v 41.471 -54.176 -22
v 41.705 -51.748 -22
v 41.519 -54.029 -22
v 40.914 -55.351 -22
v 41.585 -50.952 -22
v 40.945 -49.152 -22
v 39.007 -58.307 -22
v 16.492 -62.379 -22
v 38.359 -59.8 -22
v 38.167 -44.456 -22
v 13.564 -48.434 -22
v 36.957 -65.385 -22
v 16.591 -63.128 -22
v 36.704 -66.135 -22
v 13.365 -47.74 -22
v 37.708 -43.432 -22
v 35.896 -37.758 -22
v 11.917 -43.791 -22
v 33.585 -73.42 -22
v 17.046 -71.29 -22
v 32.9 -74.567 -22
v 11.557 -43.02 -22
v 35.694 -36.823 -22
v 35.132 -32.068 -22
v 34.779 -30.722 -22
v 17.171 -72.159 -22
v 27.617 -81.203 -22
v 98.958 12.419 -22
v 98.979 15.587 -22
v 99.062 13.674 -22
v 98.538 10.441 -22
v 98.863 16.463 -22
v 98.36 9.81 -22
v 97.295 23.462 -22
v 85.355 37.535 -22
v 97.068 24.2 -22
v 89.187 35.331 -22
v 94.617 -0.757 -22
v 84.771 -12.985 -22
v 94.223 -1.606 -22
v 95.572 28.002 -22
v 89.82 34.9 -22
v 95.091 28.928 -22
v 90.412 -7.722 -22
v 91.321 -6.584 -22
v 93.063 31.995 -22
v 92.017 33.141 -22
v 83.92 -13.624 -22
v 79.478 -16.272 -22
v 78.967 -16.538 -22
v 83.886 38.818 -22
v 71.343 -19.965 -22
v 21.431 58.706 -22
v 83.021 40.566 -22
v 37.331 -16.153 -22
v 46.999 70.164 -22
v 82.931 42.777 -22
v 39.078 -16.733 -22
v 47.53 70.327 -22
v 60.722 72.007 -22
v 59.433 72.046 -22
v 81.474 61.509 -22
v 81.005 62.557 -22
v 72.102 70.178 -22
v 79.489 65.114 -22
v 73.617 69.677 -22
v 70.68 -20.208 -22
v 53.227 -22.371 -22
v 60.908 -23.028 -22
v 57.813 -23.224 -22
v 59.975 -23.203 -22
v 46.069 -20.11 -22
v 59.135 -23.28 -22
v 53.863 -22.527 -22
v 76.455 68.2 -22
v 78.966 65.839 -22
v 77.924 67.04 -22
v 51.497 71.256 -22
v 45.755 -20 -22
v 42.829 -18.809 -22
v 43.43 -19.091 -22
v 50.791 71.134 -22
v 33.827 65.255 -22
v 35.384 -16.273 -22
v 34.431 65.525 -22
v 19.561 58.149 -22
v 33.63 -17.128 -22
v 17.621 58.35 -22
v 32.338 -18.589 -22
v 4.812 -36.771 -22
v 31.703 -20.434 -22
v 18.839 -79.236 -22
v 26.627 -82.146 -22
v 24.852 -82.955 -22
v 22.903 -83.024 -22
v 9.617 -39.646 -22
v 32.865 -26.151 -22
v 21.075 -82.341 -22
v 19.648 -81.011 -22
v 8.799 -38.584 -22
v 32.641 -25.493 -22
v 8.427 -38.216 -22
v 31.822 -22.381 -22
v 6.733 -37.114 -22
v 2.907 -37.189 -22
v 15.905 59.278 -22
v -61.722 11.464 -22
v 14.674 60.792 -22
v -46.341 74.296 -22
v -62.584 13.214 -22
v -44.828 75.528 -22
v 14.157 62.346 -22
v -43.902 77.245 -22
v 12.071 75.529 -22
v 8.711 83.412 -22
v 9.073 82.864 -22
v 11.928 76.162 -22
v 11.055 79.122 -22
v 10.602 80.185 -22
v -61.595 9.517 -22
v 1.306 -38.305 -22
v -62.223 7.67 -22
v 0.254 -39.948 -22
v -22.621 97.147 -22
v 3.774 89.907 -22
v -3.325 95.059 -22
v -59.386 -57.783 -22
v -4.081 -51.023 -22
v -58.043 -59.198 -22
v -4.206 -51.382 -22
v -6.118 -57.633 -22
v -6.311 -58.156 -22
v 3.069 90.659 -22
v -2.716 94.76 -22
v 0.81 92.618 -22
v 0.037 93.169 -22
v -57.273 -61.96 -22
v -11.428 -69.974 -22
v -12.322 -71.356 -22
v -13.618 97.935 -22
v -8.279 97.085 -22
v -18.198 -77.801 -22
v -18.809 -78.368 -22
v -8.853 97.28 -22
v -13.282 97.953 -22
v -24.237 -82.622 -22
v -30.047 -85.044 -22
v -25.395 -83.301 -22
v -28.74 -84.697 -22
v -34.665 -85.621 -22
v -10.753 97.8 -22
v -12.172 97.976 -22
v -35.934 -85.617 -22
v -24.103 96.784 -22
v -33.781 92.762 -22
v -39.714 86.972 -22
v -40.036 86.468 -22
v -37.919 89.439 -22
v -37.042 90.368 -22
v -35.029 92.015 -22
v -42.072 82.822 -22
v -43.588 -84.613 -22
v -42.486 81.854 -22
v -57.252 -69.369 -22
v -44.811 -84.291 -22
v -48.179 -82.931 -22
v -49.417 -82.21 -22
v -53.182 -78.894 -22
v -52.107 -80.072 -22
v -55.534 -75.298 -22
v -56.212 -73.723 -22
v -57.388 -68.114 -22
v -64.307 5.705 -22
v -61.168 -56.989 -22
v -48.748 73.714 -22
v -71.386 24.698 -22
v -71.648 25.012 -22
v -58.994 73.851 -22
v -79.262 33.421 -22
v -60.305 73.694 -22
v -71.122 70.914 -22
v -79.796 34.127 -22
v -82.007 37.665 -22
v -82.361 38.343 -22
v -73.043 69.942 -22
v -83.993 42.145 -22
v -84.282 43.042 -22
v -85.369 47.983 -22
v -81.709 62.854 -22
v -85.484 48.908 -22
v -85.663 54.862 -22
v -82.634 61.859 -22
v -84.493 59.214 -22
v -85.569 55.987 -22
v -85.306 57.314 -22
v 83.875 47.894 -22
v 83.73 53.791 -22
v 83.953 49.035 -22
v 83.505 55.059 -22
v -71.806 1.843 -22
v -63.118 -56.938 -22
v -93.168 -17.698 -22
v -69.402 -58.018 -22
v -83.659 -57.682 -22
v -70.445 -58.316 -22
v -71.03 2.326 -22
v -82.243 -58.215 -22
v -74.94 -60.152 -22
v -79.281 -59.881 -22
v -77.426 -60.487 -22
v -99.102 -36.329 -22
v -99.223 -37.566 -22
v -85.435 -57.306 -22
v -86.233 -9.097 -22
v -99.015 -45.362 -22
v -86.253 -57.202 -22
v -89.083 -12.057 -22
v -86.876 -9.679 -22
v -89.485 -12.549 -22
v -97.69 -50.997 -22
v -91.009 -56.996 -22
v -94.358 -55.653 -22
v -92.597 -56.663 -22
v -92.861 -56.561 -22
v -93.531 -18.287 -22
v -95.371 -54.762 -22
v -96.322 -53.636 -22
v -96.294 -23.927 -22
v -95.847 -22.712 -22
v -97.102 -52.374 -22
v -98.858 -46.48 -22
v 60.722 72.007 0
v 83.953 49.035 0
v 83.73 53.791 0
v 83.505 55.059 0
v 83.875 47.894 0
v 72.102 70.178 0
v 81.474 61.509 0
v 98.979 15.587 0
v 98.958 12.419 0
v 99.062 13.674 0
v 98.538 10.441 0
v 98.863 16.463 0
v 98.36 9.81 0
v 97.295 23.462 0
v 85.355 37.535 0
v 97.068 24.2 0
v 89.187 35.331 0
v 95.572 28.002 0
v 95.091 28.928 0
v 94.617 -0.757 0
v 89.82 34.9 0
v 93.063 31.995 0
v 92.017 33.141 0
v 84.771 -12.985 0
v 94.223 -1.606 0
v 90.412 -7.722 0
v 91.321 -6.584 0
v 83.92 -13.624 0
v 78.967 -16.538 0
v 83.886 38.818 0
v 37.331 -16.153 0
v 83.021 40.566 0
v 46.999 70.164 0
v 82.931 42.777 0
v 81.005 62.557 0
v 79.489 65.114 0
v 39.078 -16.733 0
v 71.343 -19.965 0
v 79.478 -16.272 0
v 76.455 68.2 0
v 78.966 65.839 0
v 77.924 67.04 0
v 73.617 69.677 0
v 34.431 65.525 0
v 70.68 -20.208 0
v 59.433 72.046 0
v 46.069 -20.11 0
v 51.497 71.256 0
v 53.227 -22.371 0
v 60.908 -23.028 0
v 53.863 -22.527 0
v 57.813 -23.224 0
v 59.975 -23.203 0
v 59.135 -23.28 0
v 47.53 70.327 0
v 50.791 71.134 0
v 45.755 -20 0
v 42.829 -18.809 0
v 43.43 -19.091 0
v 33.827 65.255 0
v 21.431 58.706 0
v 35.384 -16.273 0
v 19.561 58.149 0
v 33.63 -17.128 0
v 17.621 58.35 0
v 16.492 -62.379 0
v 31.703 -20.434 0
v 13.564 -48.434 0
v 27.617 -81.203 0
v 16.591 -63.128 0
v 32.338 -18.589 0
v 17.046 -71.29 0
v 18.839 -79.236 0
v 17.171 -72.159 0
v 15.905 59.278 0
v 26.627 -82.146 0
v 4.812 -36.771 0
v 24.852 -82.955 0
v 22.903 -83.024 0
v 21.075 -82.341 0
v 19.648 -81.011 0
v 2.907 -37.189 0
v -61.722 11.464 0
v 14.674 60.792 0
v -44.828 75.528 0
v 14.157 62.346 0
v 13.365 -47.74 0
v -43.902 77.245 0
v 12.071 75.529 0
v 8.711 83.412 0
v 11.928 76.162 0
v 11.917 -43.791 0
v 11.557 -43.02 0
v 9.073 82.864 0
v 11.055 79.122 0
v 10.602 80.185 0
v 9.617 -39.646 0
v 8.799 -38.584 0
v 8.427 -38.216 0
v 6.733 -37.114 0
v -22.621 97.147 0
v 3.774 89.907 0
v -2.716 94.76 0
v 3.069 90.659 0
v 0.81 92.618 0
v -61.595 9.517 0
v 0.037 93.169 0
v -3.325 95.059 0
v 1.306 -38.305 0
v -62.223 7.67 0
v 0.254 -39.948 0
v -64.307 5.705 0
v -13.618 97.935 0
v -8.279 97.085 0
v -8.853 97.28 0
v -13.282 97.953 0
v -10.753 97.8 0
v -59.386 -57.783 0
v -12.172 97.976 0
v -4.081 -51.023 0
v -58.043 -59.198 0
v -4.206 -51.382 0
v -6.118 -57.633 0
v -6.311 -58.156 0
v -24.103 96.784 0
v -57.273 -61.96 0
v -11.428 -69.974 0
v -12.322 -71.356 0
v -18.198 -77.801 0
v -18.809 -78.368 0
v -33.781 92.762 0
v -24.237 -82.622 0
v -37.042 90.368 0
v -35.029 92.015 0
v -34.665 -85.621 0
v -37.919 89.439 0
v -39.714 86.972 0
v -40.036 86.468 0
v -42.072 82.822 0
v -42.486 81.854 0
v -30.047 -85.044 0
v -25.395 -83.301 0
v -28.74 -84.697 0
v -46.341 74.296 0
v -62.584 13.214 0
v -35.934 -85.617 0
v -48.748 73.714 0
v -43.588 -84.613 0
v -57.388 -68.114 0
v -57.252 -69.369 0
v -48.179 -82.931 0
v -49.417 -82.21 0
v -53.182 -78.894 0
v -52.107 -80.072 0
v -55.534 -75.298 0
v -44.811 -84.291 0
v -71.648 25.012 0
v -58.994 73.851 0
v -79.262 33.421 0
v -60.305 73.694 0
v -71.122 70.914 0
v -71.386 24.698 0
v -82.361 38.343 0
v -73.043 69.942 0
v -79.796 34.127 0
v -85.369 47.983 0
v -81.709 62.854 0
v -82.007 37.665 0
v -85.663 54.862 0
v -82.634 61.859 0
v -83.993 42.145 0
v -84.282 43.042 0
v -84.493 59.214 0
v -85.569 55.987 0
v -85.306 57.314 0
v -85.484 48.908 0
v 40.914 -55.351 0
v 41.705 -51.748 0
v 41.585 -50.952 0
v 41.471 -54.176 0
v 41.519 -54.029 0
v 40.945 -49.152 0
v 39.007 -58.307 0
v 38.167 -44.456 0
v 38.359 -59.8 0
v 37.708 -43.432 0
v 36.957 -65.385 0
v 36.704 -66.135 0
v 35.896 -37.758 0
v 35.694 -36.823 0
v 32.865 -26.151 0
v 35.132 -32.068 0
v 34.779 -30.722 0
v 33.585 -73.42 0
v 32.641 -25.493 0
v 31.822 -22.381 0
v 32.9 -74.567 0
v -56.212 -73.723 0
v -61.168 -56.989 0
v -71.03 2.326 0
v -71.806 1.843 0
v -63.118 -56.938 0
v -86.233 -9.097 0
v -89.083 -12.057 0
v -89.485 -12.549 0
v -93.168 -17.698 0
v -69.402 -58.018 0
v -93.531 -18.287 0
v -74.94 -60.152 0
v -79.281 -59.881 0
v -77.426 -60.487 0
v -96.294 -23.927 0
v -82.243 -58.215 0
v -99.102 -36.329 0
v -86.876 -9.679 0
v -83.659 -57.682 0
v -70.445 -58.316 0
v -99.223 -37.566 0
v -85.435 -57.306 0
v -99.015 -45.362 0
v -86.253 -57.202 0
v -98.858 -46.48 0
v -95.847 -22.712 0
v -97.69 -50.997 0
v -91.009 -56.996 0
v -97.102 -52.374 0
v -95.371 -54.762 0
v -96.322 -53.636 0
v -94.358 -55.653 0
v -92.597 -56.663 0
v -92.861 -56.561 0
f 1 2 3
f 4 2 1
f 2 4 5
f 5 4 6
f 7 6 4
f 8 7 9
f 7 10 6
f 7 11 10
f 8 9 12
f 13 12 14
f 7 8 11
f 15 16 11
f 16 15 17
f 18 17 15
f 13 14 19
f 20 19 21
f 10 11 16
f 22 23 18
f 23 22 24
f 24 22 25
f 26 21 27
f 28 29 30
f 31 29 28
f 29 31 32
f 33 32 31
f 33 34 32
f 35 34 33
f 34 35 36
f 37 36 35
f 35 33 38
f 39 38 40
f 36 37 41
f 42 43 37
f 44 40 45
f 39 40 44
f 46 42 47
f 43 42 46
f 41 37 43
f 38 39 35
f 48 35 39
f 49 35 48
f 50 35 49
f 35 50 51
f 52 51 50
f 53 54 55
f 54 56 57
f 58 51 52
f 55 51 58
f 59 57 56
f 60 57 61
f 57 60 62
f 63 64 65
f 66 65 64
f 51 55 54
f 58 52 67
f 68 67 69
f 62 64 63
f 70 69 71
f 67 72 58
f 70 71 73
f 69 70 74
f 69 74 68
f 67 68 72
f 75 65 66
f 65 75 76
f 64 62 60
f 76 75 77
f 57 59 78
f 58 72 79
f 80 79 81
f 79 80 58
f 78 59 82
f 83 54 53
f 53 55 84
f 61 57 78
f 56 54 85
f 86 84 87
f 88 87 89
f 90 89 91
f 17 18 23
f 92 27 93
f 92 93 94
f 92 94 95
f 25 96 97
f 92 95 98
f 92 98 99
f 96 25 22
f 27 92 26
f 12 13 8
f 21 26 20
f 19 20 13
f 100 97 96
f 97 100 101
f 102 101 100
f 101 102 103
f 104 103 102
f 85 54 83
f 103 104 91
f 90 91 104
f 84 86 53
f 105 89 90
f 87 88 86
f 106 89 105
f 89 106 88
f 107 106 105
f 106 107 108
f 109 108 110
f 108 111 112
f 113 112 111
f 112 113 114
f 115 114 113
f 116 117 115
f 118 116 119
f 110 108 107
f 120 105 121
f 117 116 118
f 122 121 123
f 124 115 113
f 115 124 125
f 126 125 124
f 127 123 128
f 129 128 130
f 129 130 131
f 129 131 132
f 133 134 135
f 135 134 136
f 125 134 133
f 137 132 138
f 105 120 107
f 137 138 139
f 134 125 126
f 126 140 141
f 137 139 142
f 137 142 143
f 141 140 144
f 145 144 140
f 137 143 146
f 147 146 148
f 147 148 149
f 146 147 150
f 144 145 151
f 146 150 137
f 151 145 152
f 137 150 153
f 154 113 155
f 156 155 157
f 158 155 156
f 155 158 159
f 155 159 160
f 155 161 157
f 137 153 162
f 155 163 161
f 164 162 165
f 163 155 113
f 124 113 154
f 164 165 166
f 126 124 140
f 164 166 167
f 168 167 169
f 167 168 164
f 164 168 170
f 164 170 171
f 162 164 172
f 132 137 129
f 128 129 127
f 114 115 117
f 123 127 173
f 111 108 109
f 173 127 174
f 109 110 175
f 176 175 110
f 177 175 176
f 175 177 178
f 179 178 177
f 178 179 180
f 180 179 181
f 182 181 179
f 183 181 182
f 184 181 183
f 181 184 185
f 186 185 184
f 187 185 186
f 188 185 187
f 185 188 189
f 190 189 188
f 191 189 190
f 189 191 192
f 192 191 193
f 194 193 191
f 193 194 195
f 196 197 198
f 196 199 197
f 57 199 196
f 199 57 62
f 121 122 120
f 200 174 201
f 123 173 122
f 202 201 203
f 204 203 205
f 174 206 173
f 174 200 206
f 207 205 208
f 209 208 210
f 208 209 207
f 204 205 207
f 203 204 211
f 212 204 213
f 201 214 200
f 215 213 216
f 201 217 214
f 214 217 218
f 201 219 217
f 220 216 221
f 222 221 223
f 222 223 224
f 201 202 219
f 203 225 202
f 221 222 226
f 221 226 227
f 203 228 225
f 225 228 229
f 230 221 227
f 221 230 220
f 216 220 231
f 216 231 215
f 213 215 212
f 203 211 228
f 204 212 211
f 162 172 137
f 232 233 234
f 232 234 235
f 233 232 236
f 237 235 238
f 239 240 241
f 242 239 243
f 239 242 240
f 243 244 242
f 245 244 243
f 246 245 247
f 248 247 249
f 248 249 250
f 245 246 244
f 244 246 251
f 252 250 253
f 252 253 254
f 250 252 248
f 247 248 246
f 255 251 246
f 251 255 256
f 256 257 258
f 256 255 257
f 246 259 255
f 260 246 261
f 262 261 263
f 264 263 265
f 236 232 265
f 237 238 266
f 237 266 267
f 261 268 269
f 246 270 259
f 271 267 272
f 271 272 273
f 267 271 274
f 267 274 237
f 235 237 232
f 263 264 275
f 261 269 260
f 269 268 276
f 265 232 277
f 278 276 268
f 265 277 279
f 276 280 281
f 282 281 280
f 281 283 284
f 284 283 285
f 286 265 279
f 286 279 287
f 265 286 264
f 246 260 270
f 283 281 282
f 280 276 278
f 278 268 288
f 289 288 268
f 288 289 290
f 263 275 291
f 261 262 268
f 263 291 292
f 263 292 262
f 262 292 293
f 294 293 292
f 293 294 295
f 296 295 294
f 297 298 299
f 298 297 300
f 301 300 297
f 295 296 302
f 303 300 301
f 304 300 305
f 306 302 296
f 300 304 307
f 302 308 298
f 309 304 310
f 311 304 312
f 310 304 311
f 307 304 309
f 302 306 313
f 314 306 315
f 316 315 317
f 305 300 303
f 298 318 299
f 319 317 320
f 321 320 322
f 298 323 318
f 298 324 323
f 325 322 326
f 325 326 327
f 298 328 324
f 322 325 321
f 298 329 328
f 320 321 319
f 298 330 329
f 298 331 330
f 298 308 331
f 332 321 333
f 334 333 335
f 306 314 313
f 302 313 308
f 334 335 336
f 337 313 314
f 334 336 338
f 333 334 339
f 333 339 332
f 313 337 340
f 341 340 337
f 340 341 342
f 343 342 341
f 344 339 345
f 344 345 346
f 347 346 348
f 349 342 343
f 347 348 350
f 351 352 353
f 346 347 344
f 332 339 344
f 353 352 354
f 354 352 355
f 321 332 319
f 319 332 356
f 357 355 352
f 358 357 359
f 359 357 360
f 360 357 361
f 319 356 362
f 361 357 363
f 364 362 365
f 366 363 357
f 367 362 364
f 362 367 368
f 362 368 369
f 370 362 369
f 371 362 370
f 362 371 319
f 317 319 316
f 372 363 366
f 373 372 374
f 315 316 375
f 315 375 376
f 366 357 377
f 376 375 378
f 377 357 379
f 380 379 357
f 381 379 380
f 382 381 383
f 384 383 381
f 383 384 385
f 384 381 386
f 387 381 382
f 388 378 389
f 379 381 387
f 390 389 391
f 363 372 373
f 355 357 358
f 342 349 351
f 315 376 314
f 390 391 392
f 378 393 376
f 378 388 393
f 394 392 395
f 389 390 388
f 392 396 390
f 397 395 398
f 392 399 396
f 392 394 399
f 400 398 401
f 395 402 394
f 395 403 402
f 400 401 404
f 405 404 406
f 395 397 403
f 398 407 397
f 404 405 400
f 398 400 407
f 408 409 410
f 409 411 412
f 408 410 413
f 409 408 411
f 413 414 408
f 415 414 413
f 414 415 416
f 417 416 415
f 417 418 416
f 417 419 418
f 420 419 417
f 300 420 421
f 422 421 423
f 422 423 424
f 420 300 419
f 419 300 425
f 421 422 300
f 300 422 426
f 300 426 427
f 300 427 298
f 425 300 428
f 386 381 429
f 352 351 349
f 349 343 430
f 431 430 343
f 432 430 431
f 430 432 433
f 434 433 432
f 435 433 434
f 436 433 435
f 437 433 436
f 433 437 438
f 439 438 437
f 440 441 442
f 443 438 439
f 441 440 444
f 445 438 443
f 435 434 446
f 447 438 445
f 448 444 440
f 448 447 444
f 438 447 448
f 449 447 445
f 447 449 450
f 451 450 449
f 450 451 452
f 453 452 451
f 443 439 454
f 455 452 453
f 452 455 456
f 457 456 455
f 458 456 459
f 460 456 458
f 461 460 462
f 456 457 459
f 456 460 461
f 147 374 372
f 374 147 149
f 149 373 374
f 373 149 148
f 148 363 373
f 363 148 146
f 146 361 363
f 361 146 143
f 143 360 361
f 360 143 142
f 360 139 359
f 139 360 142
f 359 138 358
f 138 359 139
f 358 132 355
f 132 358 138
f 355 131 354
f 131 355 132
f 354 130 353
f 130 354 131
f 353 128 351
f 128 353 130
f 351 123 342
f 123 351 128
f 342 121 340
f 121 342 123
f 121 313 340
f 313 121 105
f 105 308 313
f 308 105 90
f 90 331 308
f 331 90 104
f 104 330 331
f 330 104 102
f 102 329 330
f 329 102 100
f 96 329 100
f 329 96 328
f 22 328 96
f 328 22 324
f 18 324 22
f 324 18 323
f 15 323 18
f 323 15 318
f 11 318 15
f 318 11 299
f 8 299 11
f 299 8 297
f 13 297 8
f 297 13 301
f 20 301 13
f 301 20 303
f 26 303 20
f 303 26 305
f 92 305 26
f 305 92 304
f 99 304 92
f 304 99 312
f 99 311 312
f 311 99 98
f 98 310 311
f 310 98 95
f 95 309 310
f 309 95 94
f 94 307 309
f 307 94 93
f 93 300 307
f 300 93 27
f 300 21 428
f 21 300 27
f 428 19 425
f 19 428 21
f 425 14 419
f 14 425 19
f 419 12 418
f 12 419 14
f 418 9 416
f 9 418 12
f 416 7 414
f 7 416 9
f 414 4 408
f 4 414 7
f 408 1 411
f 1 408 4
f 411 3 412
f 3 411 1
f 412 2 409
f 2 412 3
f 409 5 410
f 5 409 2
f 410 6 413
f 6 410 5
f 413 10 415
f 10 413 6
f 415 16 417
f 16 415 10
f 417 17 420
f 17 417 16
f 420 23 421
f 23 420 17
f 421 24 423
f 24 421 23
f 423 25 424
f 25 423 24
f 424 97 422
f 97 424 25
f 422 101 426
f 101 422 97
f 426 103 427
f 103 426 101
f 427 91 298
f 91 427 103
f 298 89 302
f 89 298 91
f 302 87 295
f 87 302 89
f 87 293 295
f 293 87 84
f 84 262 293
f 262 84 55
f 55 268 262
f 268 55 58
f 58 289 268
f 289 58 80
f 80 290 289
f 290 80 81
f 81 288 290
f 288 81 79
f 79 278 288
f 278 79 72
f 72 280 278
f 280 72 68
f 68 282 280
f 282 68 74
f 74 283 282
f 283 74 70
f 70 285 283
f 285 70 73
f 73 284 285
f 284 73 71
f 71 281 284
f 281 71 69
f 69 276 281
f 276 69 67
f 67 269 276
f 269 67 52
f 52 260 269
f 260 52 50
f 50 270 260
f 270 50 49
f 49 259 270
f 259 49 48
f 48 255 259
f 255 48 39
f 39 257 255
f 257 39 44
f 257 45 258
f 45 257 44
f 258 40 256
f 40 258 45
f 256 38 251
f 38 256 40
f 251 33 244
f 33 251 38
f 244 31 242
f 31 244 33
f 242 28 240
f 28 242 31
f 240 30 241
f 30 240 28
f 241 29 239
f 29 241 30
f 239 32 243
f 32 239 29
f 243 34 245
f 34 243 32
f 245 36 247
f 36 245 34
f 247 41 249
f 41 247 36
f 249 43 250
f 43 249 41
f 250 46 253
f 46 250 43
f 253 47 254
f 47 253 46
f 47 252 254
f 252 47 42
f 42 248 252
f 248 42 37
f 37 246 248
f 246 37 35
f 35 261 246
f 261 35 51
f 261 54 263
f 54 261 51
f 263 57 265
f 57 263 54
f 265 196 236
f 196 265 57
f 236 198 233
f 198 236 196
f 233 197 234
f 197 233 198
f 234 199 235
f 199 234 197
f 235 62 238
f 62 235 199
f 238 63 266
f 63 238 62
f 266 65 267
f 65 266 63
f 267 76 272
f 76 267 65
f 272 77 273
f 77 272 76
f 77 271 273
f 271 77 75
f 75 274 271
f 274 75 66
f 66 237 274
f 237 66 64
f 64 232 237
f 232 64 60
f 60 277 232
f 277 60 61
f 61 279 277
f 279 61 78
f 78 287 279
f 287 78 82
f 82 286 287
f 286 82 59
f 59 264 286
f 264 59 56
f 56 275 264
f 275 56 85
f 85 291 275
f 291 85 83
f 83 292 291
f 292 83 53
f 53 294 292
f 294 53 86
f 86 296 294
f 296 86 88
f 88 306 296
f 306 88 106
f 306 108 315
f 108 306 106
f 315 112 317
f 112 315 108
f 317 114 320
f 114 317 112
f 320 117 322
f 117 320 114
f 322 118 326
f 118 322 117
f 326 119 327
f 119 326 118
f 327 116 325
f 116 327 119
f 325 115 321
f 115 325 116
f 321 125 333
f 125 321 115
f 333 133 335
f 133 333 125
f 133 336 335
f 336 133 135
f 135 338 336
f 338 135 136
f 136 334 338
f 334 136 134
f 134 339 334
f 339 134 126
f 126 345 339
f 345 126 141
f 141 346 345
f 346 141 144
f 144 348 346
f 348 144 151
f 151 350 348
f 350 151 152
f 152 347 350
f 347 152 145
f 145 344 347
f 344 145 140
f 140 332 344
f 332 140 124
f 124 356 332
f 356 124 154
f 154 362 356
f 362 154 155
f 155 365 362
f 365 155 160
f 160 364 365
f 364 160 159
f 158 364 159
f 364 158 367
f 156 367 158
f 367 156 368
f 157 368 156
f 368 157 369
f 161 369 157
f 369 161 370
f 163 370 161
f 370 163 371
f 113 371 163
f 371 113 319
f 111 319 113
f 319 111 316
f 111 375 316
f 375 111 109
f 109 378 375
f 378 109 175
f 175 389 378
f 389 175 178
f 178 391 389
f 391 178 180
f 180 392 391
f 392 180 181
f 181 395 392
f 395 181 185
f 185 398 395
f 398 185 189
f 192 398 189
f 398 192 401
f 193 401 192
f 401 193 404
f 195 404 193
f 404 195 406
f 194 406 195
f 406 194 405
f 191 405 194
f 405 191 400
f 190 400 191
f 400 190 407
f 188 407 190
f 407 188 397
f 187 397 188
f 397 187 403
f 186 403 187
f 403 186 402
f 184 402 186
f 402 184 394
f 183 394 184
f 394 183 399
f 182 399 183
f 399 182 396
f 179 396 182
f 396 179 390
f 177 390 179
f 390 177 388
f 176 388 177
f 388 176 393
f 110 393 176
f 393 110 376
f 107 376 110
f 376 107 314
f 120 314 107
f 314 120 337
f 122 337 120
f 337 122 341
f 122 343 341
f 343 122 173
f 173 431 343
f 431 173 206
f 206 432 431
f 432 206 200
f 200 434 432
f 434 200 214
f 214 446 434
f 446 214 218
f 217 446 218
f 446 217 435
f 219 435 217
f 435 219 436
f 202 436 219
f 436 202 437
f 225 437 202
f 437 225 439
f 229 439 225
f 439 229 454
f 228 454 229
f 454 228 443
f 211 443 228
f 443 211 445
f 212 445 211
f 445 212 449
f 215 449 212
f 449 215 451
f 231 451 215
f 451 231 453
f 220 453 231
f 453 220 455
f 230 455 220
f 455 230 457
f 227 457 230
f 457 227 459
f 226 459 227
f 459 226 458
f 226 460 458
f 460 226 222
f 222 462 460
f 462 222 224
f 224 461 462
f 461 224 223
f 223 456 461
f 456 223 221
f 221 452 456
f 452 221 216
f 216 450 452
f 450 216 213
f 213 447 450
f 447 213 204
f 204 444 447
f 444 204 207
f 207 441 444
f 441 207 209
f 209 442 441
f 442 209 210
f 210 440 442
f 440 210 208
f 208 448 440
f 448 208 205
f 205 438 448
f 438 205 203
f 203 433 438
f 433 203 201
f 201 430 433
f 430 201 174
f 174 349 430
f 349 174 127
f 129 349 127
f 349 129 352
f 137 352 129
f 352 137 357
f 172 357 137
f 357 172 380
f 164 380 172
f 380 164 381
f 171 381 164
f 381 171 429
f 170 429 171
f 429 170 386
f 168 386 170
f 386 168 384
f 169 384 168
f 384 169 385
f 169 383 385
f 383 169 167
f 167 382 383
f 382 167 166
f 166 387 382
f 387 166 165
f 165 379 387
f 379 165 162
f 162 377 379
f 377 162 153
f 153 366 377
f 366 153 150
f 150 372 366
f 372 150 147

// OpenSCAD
// =============================================================================
//  Traced sketch board — сгенерировано boardcam.trace
// =============================================================================
//  Контур и карман извлечены детерминированно из эскиза через OpenCV.
//  Контракт boardcam совпадает с leaf.scad (кленовый лист).
// =============================================================================

/* [Заготовка] */
// Заготовка по X, мм
blank_x = 240.0;         // [150:5:800]
// Заготовка по Y, мм
blank_y = 240.0;         // [150:5:800]
// Толщина заготовки, мм
blank_thick = 22.0; // [12:1:60]

/* [Изделие] */
// Габарит изделия по X, мм
size_x = 198.33;           // [100:2:760]
// Габарит изделия по Y, мм
size_y = 193.84;           // [100:2:760]
// Высота, мм
thick = 22.0;             // [12:1:60]
// Скругление остриёв наружного контура, мм
tip_r = 5;                   // [3:0.5:20]
// Скругление выемок наружного контура, мм
notch_r = 5;                 // [4:0.5:20]
// Ширина бортика, мм
rim_w = 6.7;             // [6:1:40]
// Глубина кармана, мм
pocket_depth = 12.0; // [4:0.5:20]
// Скругление выступов кармана в плане, мм
pocket_r = 12;               // [6:0.5:40]

/* [Hidden] */
export = "";
seg_2d = 0.5;
seg_3d = 2.0;
floor_style = "steps";
floor_steps = 12;
bowl_r = 6.35;

// ---------------------------------------------------------------- геометрия ---

outline_pts = [
    [-13.45, 97.95],
    [-23.39, 97.08],
    [-34.46, 92.48],
    [-37.54, 89.96],
    [-39.89, 86.73],
    [-42.33, 82.36],
    [-44.38, 75.69],
    [-45.78, 74.29],
    [-47.67, 73.70],
    [-59.66, 73.86],
    [-72.19, 70.64],
    [-82.24, 62.42],
    [-85.10, 58.35],
    [-85.68, 55.43],
    [-85.47, 48.44],
    [-84.18, 42.58],
    [-82.21, 37.99],
    [-79.56, 33.75],
    [-71.51, 24.86],
    [-61.17, 11.37],
    [-60.35, 9.57],
    [-60.43, 8.59],
    [-61.65, 7.04],
    [-71.44, 2.12],
    [-86.58, -9.36],
    [-89.30, -12.29],
    [-93.37, -17.98],
    [-96.15, -23.29],
    [-99.24, -36.94],
    [-99.00, -45.93],
    [-97.50, -51.73],
    [-95.93, -54.27],
    [-93.69, -56.24],
    [-91.83, -56.96],
    [-85.84, -57.22],
    [-82.91, -57.84],
    [-79.46, -59.78],
    [-78.70, -61.57],
    [-80.03, -65.29],
    [-87.86, -78.09],
    [-95.56, -92.12],
    [-96.86, -95.85],
    [-96.20, -95.80],
    [-95.65, -94.97],
    [-89.70, -83.41],
    [-77.21, -62.91],
    [-74.52, -59.98],
    [-69.94, -58.11],
    [-62.08, -56.76],
    [-60.11, -57.01],
    [-58.45, -58.08],
    [-57.25, -60.76],
    [-57.40, -68.75],
    [-56.01, -74.57],
    [-52.74, -79.57],
    [-48.85, -82.66],
    [-44.22, -84.53],
    [-35.30, -85.70],
    [-29.37, -84.96],
    [-24.77, -83.04],
    [-18.48, -78.11],
    [-11.76, -70.74],
    [-6.20, -57.90],
    [-4.15, -51.20],
    [0.95, -38.17],
    [1.95, -36.45],
    [3.65, -35.47],
    [6.44, -36.25],
    [9.28, -39.06],
    [11.77, -43.39],
    [13.49, -48.08],
    [16.57, -62.75],
    [17.07, -71.73],
    [21.63, -91.08],
    [22.34, -90.52],
    [24.61, -84.98],
    [33.32, -74.04],
    [36.86, -65.77],
    [38.56, -59.00],
    [41.27, -54.80],
    [41.88, -52.91],
    [41.44, -49.99],
    [37.88, -43.97],
    [35.75, -37.30],
    [35.05, -31.37],
    [32.73, -25.83],
    [30.95, -19.07],
    [30.75, -17.08],
    [31.55, -15.30],
    [33.29, -14.40],
    [35.26, -14.62],
    [43.12, -18.97],
    [45.91, -20.06],
    [53.54, -22.47],
    [58.47, -23.34],
    [60.45, -23.16],
    [71.02, -20.11],
    [79.23, -16.42],
    [84.38, -13.35],
    [90.95, -7.22],
    [94.46, -1.20],
    [98.47, 10.12],
    [99.09, 13.04],
    [98.96, 16.03],
    [97.21, 23.84],
    [95.38, 28.49],
    [92.63, 32.65],
    [89.52, 35.14],
    [84.32, 38.13],
    [83.02, 39.64],
    [82.71, 41.58],
    [83.98, 48.46],
    [83.70, 54.44],
    [81.30, 62.06],
    [79.26, 65.50],
    [77.30, 67.76],
    [72.90, 70.05],
    [60.08, 72.11],
    [51.14, 71.22],
    [47.26, 70.26],
    [34.12, 65.41],
    [19.98, 57.94],
    [17.12, 57.31],
    [15.41, 58.29],
    [14.52, 60.05],
    [12.02, 75.85],
    [10.89, 79.68],
    [8.91, 83.15],
    [3.46, 90.32],
    [0.45, 92.93],
    [-3.01, 94.93],
    [-8.56, 97.20],
    [-11.45, 97.99]
];

pocket_pts = [
    [-41.99, 17.18],
    [-43.18, 13.37],
    [-44.97, 10.98],
    [-47.56, 9.51],
    [-52.34, 8.03],
    [-53.87, 6.78],
    [-54.65, 4.95],
    [-55.12, -1.01],
    [-57.07, -4.48],
    [-59.47, -6.25],
    [-70.15, -11.70],
    [-76.17, -18.40],
    [-77.68, -20.99],
    [-77.86, -23.94],
    [-77.30, -24.75],
    [-73.09, -27.39],
    [-70.85, -31.81],
    [-70.74, -33.80],
    [-71.86, -38.67],
    [-71.32, -47.66],
    [-70.47, -49.40],
    [-69.53, -49.67],
    [-63.69, -48.32],
    [-60.71, -48.61],
    [-57.90, -49.63],
    [-54.09, -52.85],
    [-52.20, -53.41],
    [-49.47, -52.30],
    [-47.70, -49.91],
    [-47.47, -47.95],
    [-48.45, -46.24],
    [-53.83, -43.67],
    [-56.58, -40.83],
    [-57.70, -38.05],
    [-57.92, -34.07],
    [-56.88, -30.22],
    [-50.06, -16.86],
    [-49.94, -14.87],
    [-51.22, -9.03],
    [-50.87, -6.05],
    [-50.13, -4.19],
    [-48.38, -1.77],
    [-43.71, 2.02],
    [-41.94, 2.94],
    [-38.05, 3.87],
    [-37.33, 4.53],
    [-37.07, 7.49],
    [-37.56, 9.42],
    [-40.46, 13.49]
];

function fn_for(r, seg) = max(16, ceil(2 * PI * r / seg));

module outline_region(seg) {
    offset(r = -notch_r, $fn = fn_for(notch_r, seg)) offset(delta = notch_r)
        offset(r = tip_r, $fn = fn_for(tip_r, seg)) offset(delta = -tip_r)
            polygon(outline_pts);
}

module feature_region(k, seg) {
    offset(r = -3, $fn = fn_for(3, seg)) offset(delta = 3)
        offset(r = pocket_r, $fn = fn_for(pocket_r, seg)) offset(delta = -pocket_r)
            polygon(pocket_pts);
}

module feature_cut(k, seg) {
    eps = 0.01;
    if (floor_style == "exact") {
        minkowski() {
            translate([0, 0, -pocket_depth + bowl_r])
                linear_extrude(pocket_depth + 2) offset(delta = -bowl_r) feature_region(k, seg);
            sphere(r = bowl_r, $fn = 32);
        }
    } else {
        for (s = [0 : floor_steps - 1]) {
            h0 = bowl_r * (1 - cos(90 * s / floor_steps));
            h1 = bowl_r * (1 - cos(90 * (s + 1) / floor_steps));
            d  = bowl_r * (1 - sin(90 * (s + 0.5) / floor_steps));
            if (h0 < pocket_depth)
                translate([0, 0, -pocket_depth + h0 - eps])
                    linear_extrude(min(h1, pocket_depth + 1) - h0 + 2 * eps)
                        offset(delta = -d) feature_region(k, seg);
        }
        if (pocket_depth > bowl_r)
            translate([0, 0, -pocket_depth + bowl_r - eps])
                linear_extrude(pocket_depth - bowl_r + 1 + eps) feature_region(k, seg);
    }
}

module model() {
    $fa = 2;
    difference() {
        translate([0, 0, -thick]) linear_extrude(thick) outline_region(seg_3d);
        feature_cut(1, seg_3d);
    }
}

// ------------------------------------------------------------- контракт boardcam ---

function messages() = concat(
    (pocket_depth > thick - 3)
        ? [["error", "TOO_DEEP", str("глубина отсека ", pocket_depth, " оставляет дну меньше 3 мм при высоте ", thick)]] : [],
    (max(size_x, size_y) + 20 > min(blank_x, blank_y))
        ? [["error", "BLANK_SMALL", str("доска ", max(size_x, size_y), " мм не помещается в заготовку ", blank_x, " x ", blank_y, " с полями 10 мм")]] : []
);
function has_error() = len([for (m = messages()) if (m[0] == "error") m]) > 0;

echo(boardcam_design = [
    ["schema", 1], ["shape", "traced_sketch"], ["variant", "sketch"], ["units", "mm"],
    ["blank", [blank_x, blank_y, blank_thick]], ["origin", "corner"],
    ["thick", thick],
    ["outline", ["svg", "outline"]],
    ["features", [["pocket", 1, ["svg", "pocket:1"], pocket_depth, bowl_r]]],
    ["derived", [["wall_min", rim_w], ["size", max(size_x, size_y)]]],
    ["messages", messages()]
]);

if (!has_error()) {
    if (export == "") {
        model();
    } else if (export == "outline") {
        outline_region(seg_2d);
    } else if (export == "pocket:1") {
        feature_region(1, seg_2d);
    }
}
